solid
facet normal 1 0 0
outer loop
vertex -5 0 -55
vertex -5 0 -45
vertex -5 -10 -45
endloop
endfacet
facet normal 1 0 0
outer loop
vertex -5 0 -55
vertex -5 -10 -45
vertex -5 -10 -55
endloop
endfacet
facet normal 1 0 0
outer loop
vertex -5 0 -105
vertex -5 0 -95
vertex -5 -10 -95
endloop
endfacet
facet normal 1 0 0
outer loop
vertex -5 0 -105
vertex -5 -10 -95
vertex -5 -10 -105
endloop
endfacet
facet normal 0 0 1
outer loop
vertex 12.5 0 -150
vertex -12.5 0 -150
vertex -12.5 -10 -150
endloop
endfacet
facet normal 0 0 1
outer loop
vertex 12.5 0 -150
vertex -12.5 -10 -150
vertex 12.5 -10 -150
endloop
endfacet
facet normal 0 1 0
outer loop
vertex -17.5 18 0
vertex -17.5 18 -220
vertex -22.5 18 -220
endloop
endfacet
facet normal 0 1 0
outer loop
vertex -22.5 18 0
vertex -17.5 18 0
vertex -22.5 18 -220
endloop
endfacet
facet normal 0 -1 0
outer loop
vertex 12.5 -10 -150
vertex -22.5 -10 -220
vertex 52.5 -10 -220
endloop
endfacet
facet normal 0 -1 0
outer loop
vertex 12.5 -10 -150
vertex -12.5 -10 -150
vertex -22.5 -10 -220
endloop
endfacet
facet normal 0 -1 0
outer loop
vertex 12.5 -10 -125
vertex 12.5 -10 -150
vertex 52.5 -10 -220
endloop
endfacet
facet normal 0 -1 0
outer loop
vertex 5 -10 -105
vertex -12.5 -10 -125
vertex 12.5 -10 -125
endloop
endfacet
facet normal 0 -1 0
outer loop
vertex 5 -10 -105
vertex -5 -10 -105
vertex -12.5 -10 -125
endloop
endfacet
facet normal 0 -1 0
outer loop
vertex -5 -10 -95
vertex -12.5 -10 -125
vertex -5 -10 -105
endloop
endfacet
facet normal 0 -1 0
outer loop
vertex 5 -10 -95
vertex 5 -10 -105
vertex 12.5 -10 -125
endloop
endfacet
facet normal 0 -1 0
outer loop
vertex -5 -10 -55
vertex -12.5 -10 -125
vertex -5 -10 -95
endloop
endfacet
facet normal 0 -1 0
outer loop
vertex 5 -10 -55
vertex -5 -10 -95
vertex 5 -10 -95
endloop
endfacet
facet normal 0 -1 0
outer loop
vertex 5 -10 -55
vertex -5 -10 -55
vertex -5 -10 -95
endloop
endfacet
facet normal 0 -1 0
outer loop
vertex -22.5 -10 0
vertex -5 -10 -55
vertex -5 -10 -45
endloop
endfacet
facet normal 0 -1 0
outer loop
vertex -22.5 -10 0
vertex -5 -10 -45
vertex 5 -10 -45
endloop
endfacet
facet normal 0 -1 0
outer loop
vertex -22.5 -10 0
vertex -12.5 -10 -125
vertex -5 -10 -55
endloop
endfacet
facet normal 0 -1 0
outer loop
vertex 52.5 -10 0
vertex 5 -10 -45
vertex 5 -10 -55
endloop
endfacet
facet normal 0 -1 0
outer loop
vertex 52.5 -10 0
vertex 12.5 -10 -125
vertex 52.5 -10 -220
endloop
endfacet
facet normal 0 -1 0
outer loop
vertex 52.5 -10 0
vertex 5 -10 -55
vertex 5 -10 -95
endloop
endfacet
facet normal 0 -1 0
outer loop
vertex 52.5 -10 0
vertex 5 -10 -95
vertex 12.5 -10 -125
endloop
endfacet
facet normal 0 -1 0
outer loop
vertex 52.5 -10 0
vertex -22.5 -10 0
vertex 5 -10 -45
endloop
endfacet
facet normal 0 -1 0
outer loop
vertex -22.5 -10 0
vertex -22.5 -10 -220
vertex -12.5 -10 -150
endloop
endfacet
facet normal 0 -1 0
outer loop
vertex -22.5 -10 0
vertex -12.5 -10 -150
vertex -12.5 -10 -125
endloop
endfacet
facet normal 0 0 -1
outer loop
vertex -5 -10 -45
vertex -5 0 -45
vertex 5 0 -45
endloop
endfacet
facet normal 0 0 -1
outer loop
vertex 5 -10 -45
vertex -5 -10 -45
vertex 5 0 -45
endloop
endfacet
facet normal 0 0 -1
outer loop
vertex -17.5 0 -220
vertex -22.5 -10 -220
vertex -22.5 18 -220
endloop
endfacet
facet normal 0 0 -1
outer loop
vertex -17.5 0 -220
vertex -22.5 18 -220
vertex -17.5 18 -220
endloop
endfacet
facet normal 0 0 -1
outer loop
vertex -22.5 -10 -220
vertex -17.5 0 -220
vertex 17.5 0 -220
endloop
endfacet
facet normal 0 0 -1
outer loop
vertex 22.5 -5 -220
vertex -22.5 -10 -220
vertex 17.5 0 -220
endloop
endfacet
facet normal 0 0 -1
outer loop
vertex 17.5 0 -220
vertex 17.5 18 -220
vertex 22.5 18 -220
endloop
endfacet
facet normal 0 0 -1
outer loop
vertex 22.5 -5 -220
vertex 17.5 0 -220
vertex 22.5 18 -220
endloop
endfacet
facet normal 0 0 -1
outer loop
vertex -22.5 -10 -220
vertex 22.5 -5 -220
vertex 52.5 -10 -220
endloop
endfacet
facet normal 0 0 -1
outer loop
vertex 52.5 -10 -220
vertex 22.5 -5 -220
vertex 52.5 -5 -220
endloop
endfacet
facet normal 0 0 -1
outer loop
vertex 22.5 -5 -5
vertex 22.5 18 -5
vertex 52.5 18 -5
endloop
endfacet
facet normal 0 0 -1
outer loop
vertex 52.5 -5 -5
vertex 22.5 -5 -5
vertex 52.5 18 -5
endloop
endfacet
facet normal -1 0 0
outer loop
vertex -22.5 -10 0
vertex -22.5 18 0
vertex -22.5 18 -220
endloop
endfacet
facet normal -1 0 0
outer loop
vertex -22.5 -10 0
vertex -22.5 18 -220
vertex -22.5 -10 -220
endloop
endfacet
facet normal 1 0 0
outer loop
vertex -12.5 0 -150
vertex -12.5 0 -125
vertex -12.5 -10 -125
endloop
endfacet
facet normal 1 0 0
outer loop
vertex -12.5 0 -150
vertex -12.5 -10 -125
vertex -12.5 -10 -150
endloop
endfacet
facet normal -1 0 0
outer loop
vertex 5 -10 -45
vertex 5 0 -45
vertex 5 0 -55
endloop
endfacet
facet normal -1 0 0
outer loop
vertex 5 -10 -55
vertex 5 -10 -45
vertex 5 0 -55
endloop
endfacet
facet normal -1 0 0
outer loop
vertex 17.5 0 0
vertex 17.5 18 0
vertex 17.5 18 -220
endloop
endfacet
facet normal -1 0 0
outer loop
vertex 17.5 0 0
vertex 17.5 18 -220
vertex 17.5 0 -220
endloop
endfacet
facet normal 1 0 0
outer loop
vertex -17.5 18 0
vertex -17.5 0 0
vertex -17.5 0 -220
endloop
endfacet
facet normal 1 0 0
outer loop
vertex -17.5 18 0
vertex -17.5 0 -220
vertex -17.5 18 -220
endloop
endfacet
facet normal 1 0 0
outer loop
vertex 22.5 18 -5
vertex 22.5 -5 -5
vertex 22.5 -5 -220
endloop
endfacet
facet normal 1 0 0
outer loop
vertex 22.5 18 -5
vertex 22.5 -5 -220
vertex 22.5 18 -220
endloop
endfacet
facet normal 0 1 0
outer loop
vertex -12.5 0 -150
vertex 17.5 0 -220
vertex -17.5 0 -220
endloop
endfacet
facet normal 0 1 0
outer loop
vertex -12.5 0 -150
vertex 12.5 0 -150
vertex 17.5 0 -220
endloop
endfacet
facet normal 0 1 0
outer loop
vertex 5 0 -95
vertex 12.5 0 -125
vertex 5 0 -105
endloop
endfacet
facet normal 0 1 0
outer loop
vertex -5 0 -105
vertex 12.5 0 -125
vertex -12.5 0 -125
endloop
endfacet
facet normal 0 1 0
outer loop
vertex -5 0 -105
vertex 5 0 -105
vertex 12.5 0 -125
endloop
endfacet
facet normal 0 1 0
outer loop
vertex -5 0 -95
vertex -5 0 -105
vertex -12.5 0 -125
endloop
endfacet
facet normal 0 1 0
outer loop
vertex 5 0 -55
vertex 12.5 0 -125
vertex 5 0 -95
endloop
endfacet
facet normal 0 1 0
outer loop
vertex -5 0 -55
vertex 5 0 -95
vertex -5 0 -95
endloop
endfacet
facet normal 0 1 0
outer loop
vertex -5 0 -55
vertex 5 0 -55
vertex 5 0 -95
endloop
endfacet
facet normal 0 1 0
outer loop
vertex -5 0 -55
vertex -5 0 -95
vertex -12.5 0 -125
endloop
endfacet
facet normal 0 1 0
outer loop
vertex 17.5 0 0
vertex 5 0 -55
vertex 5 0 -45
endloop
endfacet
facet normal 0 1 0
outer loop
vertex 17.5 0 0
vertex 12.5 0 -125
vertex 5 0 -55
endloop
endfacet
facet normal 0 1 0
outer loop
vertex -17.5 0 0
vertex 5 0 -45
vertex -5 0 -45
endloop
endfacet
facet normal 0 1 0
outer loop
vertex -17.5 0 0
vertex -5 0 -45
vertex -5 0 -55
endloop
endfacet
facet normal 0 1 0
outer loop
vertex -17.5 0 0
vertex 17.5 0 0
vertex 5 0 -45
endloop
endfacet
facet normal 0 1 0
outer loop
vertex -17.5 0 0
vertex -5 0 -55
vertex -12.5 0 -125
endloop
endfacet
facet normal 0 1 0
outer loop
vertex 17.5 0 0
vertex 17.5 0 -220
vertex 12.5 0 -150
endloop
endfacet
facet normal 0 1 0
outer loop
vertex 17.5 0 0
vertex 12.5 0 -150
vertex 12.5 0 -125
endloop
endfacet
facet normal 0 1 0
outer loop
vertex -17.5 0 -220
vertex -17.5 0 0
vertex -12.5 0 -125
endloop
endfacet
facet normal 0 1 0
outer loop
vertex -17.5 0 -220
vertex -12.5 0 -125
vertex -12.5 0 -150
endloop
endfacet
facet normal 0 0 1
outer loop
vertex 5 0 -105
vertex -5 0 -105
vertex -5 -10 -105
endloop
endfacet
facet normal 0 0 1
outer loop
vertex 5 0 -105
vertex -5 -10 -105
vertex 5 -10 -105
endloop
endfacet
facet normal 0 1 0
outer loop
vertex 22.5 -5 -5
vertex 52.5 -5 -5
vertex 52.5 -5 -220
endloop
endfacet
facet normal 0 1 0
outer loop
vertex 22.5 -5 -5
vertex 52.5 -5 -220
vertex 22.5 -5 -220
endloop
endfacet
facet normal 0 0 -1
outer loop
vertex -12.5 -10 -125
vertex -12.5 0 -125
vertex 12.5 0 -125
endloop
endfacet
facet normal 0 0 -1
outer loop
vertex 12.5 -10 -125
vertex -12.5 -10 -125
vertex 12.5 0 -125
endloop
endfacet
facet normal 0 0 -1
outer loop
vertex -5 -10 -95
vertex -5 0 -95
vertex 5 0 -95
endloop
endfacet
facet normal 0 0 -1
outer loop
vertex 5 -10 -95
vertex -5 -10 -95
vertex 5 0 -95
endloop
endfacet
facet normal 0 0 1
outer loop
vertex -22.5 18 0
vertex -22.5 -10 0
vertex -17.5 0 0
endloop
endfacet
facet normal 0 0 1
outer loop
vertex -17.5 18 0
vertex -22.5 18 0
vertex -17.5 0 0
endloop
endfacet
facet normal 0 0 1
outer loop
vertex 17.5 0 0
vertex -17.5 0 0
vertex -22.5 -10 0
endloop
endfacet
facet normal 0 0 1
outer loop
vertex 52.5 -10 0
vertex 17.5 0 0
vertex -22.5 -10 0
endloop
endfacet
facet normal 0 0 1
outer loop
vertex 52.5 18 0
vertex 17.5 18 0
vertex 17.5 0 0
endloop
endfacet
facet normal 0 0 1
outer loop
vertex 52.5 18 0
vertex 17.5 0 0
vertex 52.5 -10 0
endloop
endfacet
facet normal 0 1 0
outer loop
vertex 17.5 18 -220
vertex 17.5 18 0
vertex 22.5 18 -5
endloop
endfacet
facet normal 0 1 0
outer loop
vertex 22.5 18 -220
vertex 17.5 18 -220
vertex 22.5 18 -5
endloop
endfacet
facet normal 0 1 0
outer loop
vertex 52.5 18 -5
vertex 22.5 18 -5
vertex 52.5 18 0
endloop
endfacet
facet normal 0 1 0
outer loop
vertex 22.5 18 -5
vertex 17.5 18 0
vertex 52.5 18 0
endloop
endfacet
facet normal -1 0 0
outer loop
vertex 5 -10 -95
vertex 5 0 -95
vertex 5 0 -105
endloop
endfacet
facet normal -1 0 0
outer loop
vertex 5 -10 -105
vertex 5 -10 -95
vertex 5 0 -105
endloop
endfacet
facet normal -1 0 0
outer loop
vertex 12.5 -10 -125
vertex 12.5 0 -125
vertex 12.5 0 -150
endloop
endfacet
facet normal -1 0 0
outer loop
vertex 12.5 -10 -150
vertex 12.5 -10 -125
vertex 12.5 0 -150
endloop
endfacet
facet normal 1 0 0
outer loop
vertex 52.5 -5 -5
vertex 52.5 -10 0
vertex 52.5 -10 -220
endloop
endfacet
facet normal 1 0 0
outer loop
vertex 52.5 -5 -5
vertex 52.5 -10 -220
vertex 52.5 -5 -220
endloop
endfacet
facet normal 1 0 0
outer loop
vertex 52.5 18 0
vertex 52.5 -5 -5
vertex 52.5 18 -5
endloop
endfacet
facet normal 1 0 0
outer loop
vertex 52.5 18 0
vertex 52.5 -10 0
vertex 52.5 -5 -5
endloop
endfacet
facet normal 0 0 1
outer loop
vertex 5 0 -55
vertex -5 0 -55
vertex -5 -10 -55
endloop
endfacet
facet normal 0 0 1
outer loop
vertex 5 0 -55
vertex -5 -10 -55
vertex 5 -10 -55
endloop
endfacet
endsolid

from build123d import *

# Parameters (mm, degrees)
DODANIE_WYCI_GNI_CIE1_DEPTH = 220
SZKIC4_W                    = 30
SZKIC4_H                    = 23
DODANIE_WYCI_GNI_CIE3_DEPTH = 5
SZKIC5_W                    = 10
SZKIC5_H                    = 10
SZKIC5_W_2                  = 25
SZKIC5_H_2                  = 25
WYTNIJ_WYCI_GNI_CIE1_DEPTH  = 25


with BuildPart() as part:
    # Szkic1 → Dodanie-wyciągnięcie1 (new body)
    with BuildSketch(Plane.XY):
        Polygon((-22.5, -10), (52.5, -10), (52.5, -5), (22.5, -5), (22.5, 18), (17.5, 18), (17.5, 0), (-17.5, 0), (-17.5, 18), (-22.5, 18), align=None)
    extrude(amount=-DODANIE_WYCI_GNI_CIE1_DEPTH)

    # Szkic4 → Dodanie-wyciągnięcie3 (add)
    with BuildSketch(Plane.XY):
        with Locations((37.5, 6.5)):
            Rectangle(SZKIC4_W, SZKIC4_H)
    extrude(amount=-DODANIE_WYCI_GNI_CIE3_DEPTH)

    # Szkic5 → Wytnij-wyciągnięcie1 (cut)
    with BuildSketch(Plane(origin=(0, 0, 0), x_dir=(1, 0, 0), z_dir=(0, 1, 0))):
        with Locations((0, 50)):
            Rectangle(SZKIC5_W, SZKIC5_H)
        with Locations((0, 100)):
            Rectangle(SZKIC5_W, SZKIC5_H)
        with Locations((0, 137.5)):
            Rectangle(SZKIC5_W_2, SZKIC5_H_2)
    extrude(amount=-WYTNIJ_WYCI_GNI_CIE1_DEPTH, mode=Mode.SUBTRACT)


solid = part.part
